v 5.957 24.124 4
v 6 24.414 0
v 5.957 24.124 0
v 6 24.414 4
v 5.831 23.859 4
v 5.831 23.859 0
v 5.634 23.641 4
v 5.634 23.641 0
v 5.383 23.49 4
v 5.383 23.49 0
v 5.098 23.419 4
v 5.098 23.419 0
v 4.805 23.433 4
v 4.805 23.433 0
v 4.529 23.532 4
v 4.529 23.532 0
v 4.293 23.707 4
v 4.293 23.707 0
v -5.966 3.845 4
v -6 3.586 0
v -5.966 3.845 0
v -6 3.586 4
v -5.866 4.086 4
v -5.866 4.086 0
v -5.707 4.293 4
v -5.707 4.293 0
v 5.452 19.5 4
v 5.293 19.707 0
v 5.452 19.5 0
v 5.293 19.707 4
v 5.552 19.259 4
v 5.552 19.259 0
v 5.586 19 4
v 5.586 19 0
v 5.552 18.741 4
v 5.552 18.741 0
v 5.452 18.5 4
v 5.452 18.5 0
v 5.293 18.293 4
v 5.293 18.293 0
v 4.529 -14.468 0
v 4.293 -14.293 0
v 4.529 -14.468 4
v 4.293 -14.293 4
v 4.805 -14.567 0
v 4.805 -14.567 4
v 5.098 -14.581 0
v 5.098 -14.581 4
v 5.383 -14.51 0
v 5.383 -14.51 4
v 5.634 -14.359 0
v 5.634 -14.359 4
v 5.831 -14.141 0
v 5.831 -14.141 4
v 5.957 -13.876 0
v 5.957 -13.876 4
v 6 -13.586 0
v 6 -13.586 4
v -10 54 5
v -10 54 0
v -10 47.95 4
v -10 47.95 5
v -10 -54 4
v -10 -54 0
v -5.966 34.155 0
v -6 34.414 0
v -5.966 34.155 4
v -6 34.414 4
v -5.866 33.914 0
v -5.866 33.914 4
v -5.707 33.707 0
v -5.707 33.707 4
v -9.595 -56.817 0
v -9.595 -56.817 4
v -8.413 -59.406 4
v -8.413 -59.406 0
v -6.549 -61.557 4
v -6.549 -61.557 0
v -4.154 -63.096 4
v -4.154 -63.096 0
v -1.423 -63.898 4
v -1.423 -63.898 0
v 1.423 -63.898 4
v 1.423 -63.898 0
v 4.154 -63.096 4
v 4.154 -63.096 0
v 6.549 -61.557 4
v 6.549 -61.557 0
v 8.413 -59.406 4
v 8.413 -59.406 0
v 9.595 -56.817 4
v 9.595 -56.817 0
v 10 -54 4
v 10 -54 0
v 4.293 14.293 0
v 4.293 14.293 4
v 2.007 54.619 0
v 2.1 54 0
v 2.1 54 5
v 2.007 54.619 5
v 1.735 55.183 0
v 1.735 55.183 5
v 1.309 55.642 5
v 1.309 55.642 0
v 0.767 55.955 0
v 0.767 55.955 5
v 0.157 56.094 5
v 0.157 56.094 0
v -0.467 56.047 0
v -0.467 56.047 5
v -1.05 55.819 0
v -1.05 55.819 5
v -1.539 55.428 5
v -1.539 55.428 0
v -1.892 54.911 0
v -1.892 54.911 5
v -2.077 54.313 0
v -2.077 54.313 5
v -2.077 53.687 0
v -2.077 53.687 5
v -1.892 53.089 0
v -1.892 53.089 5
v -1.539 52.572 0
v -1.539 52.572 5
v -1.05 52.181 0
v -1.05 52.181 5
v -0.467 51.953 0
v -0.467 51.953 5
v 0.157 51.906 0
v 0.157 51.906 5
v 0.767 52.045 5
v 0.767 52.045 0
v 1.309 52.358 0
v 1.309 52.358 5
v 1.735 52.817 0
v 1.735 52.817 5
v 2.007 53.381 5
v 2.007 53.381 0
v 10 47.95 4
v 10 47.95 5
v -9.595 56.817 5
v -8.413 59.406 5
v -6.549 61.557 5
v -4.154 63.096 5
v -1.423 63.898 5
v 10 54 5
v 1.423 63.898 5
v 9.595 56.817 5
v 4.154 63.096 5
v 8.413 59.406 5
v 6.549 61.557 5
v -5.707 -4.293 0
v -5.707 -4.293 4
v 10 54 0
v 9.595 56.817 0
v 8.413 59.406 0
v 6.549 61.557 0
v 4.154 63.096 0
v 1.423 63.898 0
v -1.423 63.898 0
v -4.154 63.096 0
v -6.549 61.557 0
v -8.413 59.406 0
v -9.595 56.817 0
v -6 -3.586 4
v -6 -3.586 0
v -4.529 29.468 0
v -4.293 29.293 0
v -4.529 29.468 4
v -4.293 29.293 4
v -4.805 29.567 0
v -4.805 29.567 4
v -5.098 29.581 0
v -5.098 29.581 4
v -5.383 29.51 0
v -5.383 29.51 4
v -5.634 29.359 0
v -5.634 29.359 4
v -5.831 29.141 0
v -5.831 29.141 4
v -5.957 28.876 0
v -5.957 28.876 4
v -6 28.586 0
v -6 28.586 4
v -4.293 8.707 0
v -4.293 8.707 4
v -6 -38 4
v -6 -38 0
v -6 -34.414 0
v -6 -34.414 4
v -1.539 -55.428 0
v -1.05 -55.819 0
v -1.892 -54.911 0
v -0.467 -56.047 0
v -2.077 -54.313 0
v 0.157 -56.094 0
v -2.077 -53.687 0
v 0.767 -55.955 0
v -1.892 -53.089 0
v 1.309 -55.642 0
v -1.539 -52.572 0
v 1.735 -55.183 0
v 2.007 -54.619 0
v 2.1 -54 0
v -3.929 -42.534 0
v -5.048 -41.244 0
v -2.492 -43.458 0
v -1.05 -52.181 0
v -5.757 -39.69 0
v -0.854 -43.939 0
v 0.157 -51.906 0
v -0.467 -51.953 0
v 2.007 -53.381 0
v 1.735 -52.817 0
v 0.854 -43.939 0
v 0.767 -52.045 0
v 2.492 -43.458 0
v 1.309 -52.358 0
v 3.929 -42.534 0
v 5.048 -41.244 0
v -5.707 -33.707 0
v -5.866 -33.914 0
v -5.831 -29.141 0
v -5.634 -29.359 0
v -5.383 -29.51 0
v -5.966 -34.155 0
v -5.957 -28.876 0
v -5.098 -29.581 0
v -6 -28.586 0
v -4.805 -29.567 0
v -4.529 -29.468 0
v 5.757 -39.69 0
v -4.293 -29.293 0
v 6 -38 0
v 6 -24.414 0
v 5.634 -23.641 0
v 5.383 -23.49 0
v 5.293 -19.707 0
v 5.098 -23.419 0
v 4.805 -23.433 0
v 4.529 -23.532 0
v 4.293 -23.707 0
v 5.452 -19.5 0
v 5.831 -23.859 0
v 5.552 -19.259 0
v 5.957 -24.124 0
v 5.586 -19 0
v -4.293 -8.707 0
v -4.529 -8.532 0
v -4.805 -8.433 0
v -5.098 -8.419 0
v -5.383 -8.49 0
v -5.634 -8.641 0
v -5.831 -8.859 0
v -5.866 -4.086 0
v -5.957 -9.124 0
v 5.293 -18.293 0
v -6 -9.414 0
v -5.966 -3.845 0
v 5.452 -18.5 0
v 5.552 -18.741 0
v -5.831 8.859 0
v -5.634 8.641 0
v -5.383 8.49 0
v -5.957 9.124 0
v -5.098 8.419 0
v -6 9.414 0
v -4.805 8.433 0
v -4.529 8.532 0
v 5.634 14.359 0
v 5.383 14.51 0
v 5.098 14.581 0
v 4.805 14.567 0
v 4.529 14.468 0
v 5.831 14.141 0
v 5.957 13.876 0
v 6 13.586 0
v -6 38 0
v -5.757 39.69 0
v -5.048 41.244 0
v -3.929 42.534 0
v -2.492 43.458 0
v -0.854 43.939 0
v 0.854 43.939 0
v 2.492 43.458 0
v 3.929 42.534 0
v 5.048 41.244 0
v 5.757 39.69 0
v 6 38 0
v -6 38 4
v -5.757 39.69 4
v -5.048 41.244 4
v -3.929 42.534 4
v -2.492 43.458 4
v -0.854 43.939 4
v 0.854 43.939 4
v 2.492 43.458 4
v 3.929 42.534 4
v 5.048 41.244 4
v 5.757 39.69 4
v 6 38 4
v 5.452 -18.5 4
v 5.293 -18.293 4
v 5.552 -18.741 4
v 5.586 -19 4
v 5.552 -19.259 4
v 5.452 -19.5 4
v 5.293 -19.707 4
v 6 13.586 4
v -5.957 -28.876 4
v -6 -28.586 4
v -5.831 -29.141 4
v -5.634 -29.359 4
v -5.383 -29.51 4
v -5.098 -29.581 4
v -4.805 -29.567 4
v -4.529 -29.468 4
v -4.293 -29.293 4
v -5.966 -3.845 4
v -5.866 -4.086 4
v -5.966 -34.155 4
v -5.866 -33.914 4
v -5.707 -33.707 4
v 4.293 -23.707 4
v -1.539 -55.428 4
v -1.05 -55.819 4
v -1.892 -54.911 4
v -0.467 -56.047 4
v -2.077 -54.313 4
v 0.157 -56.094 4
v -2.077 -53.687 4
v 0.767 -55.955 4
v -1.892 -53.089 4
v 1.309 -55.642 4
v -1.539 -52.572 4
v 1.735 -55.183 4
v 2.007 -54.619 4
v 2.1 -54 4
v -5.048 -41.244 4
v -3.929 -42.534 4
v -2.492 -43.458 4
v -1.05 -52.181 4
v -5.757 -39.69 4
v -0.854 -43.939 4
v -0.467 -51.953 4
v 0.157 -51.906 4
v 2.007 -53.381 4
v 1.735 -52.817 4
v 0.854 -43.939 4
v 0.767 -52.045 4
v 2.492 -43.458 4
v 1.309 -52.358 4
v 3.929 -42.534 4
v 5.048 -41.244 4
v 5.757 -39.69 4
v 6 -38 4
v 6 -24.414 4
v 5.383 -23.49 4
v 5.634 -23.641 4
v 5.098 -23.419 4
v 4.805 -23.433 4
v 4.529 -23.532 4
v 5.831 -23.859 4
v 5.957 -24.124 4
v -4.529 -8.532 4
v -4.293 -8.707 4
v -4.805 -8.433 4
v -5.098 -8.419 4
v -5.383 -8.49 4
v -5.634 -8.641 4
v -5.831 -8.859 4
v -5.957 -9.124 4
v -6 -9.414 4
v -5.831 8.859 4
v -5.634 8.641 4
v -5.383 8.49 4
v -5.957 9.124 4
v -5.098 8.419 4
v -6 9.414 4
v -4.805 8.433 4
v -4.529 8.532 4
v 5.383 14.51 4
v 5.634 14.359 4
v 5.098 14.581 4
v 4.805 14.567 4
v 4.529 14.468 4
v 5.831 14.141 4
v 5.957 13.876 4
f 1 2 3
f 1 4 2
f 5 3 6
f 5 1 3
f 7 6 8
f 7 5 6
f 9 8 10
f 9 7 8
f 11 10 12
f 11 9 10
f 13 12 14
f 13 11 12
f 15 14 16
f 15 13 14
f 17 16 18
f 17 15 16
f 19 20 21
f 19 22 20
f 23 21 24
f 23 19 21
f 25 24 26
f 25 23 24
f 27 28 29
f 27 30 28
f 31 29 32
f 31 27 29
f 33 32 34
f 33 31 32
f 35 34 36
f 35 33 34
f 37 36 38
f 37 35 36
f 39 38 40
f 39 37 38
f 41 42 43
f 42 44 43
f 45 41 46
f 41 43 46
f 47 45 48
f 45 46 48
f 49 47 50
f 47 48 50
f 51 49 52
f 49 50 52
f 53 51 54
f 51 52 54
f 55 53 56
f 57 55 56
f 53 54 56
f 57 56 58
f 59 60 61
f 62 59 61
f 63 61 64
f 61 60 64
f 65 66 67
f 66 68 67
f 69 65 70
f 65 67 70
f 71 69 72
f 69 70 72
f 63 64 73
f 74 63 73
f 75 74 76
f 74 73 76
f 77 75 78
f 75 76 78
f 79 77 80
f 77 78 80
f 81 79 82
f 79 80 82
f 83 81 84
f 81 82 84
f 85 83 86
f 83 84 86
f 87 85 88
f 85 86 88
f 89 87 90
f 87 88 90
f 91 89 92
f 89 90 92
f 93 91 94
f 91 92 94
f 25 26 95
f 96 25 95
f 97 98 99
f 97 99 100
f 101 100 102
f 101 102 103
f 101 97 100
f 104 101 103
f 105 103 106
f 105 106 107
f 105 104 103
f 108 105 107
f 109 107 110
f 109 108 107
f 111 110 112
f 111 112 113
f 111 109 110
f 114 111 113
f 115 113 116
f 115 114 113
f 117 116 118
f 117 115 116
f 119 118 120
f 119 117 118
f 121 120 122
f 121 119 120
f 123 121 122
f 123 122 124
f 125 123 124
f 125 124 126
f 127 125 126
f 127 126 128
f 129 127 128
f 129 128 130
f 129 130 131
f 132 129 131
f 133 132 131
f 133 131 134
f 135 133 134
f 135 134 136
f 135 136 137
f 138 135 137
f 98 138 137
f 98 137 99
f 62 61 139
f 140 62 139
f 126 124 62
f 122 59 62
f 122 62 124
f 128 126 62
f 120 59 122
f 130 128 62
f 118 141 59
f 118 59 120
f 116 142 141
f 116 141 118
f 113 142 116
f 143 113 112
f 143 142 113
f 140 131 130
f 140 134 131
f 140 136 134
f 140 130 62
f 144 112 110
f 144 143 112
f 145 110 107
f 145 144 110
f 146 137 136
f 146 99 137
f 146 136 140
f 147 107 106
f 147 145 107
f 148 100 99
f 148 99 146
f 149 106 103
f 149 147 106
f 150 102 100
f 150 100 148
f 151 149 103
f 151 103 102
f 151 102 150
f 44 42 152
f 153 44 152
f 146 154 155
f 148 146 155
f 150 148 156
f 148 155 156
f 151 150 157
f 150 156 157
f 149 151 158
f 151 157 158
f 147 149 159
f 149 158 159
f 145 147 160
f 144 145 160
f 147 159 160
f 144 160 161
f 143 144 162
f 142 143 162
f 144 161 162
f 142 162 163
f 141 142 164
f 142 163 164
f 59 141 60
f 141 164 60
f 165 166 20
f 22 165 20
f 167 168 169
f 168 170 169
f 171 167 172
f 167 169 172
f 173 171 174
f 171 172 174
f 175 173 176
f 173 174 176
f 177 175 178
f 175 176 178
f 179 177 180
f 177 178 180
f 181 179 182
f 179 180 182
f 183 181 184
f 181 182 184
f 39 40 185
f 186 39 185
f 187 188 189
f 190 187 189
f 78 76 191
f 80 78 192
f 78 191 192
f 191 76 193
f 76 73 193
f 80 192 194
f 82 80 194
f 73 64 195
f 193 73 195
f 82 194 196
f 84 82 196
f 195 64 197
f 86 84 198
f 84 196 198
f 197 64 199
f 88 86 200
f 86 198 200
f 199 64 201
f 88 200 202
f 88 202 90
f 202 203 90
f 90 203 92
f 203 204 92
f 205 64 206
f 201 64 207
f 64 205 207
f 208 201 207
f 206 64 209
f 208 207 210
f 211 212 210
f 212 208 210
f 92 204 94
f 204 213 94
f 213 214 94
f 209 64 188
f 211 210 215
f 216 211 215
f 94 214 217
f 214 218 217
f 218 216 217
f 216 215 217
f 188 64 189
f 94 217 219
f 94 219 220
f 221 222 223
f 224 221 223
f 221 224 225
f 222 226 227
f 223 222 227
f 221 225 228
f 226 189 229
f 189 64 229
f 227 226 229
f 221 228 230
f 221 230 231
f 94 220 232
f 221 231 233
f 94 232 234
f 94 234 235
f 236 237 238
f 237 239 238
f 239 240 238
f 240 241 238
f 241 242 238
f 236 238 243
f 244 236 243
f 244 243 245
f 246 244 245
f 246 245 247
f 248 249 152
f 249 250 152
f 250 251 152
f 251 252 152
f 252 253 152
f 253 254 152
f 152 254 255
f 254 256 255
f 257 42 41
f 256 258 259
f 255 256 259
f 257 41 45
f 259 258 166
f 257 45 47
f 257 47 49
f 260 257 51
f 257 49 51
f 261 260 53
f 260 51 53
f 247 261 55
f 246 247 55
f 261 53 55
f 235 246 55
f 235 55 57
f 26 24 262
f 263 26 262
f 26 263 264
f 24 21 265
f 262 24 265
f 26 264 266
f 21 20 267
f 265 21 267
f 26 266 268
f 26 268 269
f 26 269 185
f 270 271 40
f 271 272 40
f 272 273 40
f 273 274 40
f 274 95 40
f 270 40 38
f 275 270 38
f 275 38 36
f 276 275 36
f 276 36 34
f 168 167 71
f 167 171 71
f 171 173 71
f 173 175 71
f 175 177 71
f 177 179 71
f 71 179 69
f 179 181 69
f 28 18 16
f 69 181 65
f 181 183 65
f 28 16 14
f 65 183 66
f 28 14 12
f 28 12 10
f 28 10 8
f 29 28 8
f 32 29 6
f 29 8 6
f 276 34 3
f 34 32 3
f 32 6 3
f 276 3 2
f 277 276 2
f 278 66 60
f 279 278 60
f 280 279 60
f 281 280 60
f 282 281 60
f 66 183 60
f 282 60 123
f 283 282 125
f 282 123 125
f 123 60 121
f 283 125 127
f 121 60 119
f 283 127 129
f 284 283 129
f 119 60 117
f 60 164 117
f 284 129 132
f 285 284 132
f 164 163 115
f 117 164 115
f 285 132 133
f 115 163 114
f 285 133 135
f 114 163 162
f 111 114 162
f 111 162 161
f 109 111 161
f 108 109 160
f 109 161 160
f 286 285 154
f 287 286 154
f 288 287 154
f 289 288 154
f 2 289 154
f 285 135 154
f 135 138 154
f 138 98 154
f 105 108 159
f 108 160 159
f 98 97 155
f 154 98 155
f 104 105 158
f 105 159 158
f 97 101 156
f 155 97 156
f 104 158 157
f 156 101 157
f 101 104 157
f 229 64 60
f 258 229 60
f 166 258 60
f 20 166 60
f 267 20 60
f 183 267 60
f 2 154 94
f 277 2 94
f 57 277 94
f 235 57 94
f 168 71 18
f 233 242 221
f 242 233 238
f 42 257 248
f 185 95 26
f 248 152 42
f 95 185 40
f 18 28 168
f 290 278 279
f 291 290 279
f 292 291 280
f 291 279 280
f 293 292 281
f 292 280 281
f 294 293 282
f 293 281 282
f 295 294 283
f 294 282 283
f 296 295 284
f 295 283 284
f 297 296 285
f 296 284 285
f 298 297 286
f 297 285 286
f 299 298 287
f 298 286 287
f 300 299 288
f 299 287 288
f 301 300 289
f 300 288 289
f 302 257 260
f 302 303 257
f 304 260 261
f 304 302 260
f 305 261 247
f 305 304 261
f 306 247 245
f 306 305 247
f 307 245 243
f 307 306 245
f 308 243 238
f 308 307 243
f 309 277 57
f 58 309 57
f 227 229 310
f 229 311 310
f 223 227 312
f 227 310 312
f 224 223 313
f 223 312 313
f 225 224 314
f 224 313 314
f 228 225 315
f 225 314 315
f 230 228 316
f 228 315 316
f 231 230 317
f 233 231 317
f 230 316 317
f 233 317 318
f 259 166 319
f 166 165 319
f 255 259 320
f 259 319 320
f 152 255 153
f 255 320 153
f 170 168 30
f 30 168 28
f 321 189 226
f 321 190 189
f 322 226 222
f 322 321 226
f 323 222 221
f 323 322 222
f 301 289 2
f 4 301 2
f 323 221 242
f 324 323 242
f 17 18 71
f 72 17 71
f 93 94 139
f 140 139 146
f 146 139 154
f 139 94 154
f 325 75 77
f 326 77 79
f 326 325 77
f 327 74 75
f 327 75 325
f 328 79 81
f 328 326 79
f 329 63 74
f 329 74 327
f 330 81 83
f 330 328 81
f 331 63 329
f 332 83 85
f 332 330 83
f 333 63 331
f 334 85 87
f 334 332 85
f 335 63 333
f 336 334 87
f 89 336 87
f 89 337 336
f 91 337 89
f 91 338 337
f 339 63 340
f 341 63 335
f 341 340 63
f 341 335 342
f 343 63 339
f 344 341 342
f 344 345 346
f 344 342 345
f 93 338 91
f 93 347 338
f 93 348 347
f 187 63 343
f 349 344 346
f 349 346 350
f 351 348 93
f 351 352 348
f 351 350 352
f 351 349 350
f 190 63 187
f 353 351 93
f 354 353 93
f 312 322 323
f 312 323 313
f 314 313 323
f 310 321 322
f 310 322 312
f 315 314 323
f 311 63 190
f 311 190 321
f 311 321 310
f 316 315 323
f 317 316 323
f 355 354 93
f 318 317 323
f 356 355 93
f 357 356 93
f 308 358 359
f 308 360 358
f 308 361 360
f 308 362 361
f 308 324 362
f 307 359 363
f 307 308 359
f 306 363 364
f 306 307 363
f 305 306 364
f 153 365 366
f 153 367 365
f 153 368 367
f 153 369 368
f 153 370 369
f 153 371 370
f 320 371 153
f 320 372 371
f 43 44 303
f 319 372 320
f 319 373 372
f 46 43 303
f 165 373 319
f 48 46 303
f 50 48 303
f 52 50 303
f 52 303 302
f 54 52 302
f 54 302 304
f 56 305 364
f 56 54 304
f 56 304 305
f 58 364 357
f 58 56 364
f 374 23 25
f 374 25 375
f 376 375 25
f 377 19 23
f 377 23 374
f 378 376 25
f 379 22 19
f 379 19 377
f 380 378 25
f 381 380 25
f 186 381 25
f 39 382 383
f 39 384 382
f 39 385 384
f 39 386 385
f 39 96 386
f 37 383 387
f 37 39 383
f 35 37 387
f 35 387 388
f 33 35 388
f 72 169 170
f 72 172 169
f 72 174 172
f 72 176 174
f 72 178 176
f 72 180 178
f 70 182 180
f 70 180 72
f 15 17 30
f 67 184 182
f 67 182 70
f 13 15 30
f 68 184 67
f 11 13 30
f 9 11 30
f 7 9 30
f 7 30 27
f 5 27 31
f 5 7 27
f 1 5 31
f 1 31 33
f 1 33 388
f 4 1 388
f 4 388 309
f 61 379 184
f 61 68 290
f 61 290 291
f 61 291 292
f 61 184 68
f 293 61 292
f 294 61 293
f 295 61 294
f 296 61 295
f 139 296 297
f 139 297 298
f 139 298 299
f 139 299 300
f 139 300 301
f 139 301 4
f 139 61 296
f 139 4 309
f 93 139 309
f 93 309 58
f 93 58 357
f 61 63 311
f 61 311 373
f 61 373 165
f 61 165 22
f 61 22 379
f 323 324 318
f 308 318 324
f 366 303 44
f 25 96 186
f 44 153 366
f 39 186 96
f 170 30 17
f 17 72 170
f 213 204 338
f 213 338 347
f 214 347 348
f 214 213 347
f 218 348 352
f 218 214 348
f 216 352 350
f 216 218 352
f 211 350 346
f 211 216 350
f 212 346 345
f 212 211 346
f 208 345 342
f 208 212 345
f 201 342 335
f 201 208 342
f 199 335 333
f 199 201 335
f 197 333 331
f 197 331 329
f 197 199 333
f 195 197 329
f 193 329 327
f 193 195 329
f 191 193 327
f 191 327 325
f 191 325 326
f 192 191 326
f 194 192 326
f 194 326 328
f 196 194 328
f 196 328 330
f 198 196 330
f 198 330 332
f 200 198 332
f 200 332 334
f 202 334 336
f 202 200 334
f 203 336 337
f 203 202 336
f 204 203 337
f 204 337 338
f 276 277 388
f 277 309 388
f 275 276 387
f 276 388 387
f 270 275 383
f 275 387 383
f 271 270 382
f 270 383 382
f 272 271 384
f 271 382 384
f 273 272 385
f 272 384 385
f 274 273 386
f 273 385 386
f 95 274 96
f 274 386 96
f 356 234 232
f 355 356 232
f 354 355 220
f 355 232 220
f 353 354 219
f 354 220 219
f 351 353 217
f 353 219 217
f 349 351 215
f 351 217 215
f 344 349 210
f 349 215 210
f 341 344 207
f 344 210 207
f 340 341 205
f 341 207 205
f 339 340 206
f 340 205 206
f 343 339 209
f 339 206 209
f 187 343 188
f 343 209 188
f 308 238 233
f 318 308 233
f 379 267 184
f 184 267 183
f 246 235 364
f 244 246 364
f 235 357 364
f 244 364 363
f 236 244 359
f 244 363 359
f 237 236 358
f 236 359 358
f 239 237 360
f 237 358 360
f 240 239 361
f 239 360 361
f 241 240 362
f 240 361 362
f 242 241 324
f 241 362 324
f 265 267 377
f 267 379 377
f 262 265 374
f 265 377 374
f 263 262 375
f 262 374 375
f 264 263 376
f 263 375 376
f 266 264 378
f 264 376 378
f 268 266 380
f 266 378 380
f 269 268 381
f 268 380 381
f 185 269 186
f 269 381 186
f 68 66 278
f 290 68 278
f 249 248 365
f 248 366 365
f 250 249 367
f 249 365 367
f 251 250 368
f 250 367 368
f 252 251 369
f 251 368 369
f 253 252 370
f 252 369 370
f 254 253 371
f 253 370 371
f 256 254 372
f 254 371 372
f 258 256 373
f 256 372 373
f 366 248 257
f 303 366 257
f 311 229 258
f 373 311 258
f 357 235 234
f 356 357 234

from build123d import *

# Parameters (mm, degrees)
CROQUIS1_R              = 2.1
SALIENTE_EXTRUIR1_DEPTH = 4
CROQUIS1_6_R            = 2.1
SALIENTE_EXTRUIR3_DEPTH = 5
REDONDEO1_R             = 1


with BuildPart() as part:
    # Croquis1 → Saliente-Extruir1 (new body)
    with BuildSketch(Plane.XY):
        with BuildLine():
            ThreePointArc((10, 54), (0, 64), (-10, 54))
            Line((-10, 54), (-10, -54))
            ThreePointArc((-10, -54), (0, -64), (10, -54))
            Line((10, -54), (10, 54))
        make_face()
        with Locations((0, 54)):
            Circle(CROQUIS1_R, mode=Mode.SUBTRACT)
        with BuildLine():
            Line((6, 38), (6, 22))
            Line((6, 22), (-6, 34))
            Line((-6, 34), (-6, 38))
            ThreePointArc((-6, 38), (0, 44), (6, 38))
        make_face(mode=Mode.SUBTRACT)
        Polygon((-6, 7), (-6, 31), (6, 19), align=None, mode=Mode.SUBTRACT)
        Polygon((-6, -4), (-6, 4), (6, 16), (6, -16), align=None, mode=Mode.SUBTRACT)
        Polygon((-6, -31), (-6, -7), (6, -19), align=None, mode=Mode.SUBTRACT)
        with BuildLine():
            Line((-6, -38), (-6, -34))
            Line((-6, -34), (6, -22))
            Line((6, -22), (6, -38))
            ThreePointArc((6, -38), (0, -44), (-6, -38))
        make_face(mode=Mode.SUBTRACT)
        with Locations((0, -54)):
            Circle(CROQUIS1_R, mode=Mode.SUBTRACT)
    extrude(amount=SALIENTE_EXTRUIR1_DEPTH)

    # Croquis1<6> → Saliente-Extruir3 (add)
    with BuildSketch(Plane.XY):
        with BuildLine():
            Line((10, 47.95), (10, 54))
            ThreePointArc((10, 54), (0, 64), (-10, 54))
            Line((-10, 54), (-10, 47.95))
            Line((-10, 47.95), (10, 47.95))
        make_face()
        with Locations((0, 54)):
            Circle(CROQUIS1_6_R, mode=Mode.SUBTRACT)
    extrude(amount=SALIENTE_EXTRUIR3_DEPTH)

    # Redondeo1
    redondeo1_edges = [part.edges().sort_by_distance(p)[0] for p in [
        (6, 22, 2),
        (6, 16, 2),
        (6, 19, 2),
        (-6, 31, 2),
        (-6, 7, 2),
        (6, -22, 2),
        (6, -16, 2),
        (6, -19, 2),
        (-6, -31, 2),
        (-6, -7, 2),
        (-6, 34, 2),
        (-6, -4, 2),
        (-6, -34, 2),
        (-6, 4, 2),
    ]]
    fillet(redondeo1_edges, radius=REDONDEO1_R)


solid = part.part
